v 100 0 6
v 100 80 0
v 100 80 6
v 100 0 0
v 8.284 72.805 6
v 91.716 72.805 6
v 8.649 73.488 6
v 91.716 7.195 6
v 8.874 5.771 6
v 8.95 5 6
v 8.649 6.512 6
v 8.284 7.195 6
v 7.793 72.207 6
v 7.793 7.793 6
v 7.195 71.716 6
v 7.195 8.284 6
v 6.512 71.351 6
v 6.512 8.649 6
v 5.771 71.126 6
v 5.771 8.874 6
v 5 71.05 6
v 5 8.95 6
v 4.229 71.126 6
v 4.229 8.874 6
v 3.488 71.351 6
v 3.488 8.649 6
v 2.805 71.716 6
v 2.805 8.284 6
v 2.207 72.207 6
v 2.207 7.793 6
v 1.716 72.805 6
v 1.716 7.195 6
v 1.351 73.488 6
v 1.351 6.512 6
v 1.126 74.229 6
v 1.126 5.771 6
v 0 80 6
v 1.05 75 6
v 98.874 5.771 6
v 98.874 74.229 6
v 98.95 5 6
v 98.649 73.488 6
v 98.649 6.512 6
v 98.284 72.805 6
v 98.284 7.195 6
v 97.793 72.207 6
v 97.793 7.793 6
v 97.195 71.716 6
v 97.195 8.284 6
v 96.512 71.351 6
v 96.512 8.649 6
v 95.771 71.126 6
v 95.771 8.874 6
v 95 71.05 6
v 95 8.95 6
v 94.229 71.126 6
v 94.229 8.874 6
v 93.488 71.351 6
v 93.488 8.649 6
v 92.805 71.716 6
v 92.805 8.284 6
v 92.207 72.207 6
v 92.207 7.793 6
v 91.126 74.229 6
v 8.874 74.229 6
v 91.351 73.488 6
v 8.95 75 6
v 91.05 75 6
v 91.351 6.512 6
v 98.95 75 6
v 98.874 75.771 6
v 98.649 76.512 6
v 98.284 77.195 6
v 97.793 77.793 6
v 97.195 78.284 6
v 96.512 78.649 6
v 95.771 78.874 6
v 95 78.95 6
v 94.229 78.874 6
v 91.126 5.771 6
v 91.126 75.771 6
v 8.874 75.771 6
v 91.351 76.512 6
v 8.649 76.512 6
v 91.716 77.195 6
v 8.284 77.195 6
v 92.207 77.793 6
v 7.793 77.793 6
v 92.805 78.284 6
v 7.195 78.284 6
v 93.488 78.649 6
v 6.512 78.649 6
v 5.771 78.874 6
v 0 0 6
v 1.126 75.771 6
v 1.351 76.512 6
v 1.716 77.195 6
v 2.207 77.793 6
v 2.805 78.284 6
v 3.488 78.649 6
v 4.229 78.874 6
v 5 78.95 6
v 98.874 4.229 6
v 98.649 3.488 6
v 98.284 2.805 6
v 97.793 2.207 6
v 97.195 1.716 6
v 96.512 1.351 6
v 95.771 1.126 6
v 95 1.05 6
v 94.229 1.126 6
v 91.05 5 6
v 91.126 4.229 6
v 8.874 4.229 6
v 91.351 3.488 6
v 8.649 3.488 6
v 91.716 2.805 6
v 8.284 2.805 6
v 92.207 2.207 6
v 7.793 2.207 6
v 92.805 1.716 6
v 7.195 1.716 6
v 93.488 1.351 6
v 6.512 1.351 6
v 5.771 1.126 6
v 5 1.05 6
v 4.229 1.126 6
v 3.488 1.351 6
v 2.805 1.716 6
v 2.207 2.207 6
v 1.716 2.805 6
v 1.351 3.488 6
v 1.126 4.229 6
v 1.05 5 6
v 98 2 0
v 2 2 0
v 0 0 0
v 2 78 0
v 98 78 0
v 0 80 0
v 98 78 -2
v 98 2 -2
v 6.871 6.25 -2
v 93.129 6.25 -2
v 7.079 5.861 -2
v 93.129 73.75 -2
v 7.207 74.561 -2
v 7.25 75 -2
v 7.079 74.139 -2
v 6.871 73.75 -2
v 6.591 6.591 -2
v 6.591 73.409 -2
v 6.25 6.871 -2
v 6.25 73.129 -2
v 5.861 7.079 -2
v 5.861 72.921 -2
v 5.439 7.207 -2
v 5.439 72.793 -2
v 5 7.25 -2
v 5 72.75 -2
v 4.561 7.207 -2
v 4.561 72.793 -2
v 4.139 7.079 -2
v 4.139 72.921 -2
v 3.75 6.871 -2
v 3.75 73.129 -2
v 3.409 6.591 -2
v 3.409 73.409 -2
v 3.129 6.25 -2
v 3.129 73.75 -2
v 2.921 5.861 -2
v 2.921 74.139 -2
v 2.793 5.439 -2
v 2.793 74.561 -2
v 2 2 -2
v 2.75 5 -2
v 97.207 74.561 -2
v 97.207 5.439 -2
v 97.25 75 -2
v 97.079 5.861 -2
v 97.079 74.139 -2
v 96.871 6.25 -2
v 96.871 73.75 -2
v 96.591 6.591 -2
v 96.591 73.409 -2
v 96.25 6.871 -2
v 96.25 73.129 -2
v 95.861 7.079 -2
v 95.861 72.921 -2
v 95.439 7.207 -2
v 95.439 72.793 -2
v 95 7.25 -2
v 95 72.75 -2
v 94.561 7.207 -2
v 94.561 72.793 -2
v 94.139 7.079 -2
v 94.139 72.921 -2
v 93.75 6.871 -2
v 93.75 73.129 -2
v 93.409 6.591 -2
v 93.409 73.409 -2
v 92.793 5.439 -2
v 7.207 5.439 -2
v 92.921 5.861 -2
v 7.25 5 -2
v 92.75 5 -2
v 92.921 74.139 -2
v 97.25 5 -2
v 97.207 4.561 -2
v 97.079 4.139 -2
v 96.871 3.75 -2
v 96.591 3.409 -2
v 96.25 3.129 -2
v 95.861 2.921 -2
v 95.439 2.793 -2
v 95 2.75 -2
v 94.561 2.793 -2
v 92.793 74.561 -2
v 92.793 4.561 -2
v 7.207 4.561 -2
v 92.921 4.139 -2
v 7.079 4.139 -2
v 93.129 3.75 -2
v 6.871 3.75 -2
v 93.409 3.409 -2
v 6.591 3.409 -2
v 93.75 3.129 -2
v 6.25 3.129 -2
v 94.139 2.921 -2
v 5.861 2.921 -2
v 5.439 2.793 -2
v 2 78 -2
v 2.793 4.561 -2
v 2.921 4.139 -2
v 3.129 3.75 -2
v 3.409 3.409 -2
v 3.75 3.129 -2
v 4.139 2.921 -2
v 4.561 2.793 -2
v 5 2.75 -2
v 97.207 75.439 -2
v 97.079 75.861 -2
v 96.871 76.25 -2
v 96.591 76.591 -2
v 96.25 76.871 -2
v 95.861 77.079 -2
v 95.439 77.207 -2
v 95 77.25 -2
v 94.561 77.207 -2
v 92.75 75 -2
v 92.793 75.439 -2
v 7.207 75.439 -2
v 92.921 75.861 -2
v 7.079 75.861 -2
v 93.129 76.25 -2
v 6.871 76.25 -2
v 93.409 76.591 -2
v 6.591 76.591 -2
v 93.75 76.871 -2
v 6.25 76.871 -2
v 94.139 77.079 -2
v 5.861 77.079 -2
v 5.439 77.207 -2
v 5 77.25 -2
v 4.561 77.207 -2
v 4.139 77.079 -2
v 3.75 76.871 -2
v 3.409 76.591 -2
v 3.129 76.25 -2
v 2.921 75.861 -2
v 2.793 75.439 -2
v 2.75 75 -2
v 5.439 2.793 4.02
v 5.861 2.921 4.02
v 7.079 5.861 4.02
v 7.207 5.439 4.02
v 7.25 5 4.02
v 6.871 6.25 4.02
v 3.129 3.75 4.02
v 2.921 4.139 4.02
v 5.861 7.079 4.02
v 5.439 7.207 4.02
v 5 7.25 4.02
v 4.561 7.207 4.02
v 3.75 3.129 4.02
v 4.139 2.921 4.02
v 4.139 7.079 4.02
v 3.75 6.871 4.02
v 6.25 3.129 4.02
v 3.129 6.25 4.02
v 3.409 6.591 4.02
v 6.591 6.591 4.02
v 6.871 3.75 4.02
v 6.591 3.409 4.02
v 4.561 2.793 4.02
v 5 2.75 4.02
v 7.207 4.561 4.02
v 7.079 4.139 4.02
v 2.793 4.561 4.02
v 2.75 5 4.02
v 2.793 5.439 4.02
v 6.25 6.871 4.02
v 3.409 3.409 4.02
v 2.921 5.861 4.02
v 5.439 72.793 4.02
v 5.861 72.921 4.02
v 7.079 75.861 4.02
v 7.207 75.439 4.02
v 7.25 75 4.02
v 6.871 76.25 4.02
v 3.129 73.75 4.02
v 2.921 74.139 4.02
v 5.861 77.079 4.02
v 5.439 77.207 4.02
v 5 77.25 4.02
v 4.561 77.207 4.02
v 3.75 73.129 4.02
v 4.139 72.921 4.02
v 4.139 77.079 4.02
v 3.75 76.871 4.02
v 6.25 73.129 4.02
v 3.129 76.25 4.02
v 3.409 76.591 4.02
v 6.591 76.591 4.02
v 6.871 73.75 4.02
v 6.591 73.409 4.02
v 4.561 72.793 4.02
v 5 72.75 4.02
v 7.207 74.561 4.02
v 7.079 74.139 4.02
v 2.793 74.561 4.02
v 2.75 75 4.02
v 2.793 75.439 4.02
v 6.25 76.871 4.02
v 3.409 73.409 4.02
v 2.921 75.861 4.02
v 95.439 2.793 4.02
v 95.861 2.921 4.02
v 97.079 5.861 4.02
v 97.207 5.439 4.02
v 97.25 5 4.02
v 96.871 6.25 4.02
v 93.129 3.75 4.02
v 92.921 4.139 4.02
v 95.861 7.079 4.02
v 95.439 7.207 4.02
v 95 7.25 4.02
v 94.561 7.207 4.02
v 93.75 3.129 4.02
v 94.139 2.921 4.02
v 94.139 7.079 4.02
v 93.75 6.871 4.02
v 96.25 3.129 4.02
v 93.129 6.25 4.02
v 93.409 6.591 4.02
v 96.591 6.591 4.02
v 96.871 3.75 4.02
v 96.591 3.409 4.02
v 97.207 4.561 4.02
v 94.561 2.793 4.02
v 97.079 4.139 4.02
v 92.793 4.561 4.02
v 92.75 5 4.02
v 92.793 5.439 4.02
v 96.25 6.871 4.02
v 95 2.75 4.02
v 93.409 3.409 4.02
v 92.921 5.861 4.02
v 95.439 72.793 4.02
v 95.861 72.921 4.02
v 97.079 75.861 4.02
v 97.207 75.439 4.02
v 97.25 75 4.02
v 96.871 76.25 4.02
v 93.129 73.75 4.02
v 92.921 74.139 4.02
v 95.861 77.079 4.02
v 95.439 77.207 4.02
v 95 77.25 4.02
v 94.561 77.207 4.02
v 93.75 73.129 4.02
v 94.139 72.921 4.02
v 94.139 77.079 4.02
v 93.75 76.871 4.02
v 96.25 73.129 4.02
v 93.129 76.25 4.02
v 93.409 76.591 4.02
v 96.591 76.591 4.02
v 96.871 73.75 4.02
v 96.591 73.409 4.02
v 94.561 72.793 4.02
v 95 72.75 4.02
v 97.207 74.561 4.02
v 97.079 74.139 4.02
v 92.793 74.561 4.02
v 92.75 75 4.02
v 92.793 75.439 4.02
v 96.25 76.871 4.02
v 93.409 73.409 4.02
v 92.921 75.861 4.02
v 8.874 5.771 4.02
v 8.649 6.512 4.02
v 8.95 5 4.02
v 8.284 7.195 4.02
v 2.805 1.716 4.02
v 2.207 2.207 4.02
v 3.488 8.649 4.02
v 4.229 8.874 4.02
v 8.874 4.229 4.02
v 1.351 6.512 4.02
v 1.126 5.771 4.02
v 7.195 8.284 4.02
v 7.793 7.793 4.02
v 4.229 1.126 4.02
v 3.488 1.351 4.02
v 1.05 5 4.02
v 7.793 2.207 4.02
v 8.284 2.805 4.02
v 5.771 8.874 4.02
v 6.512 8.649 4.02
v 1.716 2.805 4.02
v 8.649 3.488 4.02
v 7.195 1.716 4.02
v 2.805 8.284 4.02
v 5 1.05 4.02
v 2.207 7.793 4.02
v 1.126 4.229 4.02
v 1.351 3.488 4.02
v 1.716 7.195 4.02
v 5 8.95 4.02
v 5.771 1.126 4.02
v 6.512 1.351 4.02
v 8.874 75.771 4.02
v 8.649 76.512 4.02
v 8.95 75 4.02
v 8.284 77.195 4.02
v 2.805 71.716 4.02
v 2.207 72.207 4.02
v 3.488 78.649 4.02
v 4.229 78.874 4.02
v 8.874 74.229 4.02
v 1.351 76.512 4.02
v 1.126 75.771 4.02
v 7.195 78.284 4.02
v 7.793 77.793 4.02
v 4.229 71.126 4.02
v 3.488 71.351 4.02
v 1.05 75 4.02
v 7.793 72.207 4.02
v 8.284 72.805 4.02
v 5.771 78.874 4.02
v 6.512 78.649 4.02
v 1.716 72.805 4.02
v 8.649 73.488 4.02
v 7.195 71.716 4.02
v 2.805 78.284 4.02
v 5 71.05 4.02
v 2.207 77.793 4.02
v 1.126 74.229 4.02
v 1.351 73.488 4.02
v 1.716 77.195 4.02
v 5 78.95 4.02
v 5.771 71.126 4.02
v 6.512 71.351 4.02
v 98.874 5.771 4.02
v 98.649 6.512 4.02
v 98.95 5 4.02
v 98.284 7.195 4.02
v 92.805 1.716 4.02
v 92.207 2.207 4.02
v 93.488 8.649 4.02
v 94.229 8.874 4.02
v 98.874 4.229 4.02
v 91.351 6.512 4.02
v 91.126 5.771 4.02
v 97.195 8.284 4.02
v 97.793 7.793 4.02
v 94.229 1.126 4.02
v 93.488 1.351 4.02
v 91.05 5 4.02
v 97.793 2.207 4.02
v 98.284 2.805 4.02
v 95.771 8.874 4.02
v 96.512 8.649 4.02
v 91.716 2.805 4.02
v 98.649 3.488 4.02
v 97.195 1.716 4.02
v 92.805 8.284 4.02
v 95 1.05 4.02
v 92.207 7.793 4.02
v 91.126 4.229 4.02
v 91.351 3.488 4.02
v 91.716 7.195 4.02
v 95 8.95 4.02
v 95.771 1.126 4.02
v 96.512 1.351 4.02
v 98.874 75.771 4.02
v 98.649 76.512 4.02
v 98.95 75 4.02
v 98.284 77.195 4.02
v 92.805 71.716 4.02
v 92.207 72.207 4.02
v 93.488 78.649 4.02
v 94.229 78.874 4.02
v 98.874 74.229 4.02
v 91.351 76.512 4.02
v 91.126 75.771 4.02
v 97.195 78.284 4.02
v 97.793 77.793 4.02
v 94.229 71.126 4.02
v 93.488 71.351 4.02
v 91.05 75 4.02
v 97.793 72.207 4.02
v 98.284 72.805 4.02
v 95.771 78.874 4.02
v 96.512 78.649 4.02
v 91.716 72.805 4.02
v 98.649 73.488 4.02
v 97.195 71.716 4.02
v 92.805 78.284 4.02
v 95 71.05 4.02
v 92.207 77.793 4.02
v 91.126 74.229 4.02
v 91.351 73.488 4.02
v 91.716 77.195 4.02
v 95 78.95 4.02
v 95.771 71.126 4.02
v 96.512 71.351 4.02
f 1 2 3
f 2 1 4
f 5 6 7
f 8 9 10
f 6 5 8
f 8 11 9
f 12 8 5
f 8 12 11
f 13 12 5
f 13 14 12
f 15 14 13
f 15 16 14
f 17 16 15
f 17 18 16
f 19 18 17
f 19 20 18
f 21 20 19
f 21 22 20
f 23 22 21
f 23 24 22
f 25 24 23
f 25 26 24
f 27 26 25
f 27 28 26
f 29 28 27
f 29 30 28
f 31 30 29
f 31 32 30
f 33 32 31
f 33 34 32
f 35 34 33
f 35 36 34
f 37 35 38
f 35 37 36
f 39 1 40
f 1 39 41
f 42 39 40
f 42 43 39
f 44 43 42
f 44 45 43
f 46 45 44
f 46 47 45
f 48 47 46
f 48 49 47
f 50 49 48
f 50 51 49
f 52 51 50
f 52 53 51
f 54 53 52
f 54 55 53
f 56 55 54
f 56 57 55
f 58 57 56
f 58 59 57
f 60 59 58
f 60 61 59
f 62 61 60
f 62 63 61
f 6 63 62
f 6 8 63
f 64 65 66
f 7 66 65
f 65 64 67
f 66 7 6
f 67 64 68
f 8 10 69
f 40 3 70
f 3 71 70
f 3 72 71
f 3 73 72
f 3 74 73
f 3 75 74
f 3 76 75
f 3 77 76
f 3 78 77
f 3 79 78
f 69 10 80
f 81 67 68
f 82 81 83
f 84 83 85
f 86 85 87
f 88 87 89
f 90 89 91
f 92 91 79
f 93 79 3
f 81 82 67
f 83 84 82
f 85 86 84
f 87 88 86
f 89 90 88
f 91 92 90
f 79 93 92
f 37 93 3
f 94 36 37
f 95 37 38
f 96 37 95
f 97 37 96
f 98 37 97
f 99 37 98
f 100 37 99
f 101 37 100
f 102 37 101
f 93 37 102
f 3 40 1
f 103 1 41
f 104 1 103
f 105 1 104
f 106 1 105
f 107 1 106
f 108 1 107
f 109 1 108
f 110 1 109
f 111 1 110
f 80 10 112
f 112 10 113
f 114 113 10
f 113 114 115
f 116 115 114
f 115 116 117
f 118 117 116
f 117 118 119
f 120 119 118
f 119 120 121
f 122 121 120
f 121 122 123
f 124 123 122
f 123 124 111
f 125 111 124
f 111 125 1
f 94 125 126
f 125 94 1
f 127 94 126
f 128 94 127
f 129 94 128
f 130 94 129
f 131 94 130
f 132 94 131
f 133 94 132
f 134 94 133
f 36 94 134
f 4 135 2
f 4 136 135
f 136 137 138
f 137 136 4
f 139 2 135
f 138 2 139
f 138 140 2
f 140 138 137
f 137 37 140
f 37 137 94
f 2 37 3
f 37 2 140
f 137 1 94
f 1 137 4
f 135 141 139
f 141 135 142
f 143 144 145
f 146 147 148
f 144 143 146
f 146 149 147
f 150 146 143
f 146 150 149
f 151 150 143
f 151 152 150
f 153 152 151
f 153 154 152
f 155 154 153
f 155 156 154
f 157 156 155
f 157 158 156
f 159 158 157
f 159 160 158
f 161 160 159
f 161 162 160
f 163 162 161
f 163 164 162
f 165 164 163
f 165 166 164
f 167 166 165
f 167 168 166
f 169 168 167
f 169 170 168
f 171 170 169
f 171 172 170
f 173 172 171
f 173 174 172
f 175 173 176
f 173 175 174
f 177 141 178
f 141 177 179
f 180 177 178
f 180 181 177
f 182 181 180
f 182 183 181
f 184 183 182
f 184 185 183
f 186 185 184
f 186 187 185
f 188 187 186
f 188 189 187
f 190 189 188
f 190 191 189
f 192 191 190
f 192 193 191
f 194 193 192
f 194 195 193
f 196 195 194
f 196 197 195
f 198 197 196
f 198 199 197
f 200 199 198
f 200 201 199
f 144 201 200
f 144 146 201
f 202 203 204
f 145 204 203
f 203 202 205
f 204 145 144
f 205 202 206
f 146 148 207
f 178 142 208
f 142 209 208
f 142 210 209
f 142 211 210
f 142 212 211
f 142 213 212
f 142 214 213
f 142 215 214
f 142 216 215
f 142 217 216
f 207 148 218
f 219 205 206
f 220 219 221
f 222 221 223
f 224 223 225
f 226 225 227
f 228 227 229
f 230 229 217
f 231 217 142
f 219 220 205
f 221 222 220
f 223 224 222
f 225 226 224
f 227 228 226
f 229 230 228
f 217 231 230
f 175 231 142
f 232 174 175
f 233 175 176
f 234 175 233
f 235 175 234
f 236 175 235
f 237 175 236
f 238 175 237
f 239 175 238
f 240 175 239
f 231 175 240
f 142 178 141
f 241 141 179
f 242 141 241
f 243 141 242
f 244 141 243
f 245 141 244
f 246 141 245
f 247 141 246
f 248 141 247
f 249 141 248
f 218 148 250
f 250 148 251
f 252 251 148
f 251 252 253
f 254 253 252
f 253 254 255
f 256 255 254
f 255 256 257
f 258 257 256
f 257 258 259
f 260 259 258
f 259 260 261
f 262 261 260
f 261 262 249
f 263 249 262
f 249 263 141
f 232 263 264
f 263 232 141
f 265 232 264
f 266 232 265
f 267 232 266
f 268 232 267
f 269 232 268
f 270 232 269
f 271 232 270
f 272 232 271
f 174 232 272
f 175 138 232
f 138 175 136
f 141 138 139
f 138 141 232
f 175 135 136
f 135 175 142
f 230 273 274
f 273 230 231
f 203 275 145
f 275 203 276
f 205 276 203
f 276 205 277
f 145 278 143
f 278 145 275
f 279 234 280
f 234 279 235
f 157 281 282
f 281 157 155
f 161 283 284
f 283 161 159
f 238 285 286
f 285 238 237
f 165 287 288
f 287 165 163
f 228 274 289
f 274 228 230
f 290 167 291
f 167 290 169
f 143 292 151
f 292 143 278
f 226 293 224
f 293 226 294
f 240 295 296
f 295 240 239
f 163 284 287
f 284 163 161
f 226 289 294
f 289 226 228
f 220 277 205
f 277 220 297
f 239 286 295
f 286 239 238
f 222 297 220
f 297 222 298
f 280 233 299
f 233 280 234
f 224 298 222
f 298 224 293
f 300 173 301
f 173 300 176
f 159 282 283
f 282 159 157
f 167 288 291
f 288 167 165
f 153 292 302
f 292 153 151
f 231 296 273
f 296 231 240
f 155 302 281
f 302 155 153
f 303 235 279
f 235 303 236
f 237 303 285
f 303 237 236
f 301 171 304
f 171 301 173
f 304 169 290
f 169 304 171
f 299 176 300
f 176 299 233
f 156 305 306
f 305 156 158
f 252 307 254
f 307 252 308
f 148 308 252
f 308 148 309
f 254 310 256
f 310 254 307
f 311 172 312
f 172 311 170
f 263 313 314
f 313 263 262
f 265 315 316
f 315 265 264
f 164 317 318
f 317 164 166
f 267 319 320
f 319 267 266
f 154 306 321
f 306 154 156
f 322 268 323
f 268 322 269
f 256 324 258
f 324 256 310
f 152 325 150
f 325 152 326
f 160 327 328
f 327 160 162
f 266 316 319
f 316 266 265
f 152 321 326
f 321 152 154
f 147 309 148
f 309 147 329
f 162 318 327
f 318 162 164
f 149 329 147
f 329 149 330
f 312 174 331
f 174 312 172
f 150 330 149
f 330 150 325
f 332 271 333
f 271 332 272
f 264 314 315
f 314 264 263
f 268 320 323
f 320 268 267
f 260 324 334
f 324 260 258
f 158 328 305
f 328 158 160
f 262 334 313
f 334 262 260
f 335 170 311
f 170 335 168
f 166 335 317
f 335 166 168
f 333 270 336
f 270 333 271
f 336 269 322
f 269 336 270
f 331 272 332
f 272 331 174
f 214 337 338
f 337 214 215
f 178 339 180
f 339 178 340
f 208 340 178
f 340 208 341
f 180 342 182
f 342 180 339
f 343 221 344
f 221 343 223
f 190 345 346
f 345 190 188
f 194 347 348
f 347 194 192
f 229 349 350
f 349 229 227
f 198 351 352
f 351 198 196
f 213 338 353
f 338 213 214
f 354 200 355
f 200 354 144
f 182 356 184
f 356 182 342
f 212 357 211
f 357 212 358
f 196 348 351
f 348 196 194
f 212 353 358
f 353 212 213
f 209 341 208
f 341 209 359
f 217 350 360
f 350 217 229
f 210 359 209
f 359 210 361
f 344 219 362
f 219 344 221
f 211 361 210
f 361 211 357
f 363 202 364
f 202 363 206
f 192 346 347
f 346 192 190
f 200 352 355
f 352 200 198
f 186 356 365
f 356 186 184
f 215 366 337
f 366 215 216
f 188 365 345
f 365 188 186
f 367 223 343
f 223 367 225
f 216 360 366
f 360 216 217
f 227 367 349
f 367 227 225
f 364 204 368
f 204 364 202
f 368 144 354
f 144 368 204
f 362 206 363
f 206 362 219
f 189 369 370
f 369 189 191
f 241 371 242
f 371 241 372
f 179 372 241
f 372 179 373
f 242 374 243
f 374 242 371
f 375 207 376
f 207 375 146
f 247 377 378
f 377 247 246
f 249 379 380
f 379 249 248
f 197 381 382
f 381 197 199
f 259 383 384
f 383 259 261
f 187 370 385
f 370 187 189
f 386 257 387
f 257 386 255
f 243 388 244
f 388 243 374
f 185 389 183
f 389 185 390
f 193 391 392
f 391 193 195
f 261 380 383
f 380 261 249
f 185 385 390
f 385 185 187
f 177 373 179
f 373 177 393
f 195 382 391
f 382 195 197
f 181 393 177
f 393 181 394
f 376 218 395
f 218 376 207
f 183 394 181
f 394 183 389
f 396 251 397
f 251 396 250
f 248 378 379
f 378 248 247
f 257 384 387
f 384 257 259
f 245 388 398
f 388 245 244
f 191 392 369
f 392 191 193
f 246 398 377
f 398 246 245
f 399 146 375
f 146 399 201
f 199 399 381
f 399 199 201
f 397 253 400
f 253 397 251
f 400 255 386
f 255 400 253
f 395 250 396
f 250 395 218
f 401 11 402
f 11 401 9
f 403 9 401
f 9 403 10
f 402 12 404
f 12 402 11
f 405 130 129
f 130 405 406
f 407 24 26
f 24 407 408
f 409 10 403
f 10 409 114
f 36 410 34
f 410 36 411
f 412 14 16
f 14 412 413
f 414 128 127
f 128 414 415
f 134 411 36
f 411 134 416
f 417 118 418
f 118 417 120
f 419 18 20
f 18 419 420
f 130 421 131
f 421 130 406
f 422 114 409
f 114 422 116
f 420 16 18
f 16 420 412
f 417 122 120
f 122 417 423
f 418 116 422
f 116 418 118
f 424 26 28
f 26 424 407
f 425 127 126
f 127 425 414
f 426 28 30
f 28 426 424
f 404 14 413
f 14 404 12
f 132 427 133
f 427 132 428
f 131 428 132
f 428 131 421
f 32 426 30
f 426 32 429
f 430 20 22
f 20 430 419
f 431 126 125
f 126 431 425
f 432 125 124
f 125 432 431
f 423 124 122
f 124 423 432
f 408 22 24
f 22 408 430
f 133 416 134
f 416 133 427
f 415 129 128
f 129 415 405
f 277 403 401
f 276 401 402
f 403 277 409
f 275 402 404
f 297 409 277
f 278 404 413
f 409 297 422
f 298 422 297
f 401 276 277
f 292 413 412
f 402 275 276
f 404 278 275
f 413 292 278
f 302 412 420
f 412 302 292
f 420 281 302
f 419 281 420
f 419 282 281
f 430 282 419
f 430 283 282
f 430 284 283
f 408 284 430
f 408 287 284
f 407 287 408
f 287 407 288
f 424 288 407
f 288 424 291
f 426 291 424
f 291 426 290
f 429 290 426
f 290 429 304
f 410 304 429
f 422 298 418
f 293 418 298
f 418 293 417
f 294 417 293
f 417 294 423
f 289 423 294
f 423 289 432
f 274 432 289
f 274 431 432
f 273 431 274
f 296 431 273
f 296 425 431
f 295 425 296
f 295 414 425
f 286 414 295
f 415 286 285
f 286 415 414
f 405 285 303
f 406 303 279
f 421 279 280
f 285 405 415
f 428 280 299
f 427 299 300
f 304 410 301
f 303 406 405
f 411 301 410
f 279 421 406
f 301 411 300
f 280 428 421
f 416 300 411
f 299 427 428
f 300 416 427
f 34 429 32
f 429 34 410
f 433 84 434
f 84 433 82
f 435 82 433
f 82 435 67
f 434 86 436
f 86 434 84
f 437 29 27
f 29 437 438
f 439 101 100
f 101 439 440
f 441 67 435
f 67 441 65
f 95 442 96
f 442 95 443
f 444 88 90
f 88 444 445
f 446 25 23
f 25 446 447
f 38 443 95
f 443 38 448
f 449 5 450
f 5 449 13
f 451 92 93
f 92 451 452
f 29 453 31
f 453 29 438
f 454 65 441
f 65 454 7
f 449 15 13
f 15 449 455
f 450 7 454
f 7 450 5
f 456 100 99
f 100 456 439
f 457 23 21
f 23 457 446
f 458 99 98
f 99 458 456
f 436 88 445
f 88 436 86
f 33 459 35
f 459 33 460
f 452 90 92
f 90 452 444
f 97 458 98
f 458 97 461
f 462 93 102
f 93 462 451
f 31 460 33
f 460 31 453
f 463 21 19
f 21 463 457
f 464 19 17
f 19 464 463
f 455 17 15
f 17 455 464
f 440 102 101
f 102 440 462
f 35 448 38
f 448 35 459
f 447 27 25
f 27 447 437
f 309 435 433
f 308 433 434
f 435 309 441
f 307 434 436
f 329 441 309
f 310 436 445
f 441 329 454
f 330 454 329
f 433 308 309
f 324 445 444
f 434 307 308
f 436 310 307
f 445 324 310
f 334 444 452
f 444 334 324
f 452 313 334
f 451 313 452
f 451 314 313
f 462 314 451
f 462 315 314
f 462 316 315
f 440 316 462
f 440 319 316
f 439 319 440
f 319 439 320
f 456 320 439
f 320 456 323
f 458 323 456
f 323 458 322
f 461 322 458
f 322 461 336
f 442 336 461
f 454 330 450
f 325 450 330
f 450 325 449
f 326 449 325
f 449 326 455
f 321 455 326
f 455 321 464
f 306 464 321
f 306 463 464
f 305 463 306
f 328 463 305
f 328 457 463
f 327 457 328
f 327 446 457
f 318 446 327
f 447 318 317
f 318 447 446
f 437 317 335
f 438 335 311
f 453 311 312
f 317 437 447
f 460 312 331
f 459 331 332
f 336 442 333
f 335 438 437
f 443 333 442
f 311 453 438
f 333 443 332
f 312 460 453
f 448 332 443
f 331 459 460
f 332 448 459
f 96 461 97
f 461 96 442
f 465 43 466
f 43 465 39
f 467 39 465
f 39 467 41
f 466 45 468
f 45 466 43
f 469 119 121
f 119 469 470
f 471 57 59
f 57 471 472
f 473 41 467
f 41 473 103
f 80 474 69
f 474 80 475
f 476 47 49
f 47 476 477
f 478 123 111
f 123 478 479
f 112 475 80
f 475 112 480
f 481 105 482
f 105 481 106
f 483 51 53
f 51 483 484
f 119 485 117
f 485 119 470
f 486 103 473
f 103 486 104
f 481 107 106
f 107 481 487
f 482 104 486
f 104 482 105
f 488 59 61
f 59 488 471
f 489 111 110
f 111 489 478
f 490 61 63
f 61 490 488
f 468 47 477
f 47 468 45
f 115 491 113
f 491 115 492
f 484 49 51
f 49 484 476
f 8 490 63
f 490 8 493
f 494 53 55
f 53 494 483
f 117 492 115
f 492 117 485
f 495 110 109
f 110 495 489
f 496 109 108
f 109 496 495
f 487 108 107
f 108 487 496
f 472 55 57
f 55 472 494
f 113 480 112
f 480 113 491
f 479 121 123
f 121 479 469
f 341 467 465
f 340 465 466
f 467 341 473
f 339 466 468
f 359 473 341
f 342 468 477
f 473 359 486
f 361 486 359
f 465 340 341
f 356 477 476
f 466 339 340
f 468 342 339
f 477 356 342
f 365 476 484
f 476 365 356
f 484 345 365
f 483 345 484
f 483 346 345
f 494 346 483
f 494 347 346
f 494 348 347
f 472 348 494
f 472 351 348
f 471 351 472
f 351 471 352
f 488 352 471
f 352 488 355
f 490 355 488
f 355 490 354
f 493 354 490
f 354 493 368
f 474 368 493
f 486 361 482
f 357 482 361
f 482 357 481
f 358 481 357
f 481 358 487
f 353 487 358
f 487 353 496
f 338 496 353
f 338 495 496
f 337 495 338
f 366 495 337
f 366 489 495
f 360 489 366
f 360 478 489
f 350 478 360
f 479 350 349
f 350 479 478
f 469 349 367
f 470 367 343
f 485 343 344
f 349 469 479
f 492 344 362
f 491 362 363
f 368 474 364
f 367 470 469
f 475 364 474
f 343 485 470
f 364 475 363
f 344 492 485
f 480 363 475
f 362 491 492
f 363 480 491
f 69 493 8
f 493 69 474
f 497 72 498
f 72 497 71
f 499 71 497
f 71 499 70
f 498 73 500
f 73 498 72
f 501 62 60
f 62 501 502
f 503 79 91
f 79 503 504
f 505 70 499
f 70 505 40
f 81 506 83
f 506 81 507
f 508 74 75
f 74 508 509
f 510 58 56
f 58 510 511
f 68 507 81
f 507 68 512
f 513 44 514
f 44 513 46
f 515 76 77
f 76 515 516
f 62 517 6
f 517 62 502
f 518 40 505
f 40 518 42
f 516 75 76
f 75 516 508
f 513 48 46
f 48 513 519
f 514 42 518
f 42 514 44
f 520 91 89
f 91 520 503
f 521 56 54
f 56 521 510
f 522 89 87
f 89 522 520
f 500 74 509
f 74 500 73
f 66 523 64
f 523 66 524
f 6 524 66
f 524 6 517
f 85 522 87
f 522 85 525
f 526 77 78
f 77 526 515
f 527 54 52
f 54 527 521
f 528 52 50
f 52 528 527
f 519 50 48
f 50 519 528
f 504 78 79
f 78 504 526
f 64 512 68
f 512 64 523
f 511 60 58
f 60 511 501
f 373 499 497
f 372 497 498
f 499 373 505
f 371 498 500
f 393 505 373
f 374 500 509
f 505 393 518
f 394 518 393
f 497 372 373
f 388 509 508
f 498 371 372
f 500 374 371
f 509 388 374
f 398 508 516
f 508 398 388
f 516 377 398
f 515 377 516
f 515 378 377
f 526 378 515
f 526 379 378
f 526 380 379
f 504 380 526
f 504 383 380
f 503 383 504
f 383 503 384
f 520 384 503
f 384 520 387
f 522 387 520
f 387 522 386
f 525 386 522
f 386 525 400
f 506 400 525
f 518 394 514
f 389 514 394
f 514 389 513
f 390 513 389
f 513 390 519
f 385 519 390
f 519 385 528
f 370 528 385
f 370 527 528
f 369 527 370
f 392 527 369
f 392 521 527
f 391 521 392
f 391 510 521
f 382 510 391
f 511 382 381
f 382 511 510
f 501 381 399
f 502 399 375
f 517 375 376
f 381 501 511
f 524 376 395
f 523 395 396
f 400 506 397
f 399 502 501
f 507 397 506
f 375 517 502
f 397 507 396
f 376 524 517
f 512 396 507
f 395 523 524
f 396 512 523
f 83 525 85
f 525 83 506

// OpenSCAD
$fn = 32;

// ----------------------------------------------------------------------
// Enclosure lid: 100 x 80 x 6 mm, 4 bolt holes
// ----------------------------------------------------------------------

// --- parameters (mm) ---
length = 100;             // lid length, X
width = 80;               // lid width, Y
plate_t = 6;              // lid plate thickness
bolt_d = 4.5;             // bolt clearance
boss_lip = 5;             // bolt hole inset from the corner
sink = 1;                 // overlap of the lip and ribs into the plate
lip_h = 3;                // lip height below the plate
lip_wall = 2;             // lip wall thickness
cs_d = 7.9;               // countersink diameter
cs_h = 1.98;              // countersink depth

module plate() {
  cube([length, width, plate_t]);
  /* lip that drops into the housing opening, sunk into the plate */
  translate([lip_wall, lip_wall, -lip_h + sink]) cube([length - 2 * lip_wall, width - 2 * lip_wall, lip_h]);
}

difference() {
  plate();
  /* bolt pattern matching the corner bosses */
  for (sx = [0, 1]) for (sy = [0, 1])
    translate([sx * (length - 2 * boss_lip) + boss_lip, sy * (width - 2 * boss_lip) + boss_lip, -lip_h - 1])
      cylinder(h = plate_t + lip_h + 2, d = bolt_d);
  /* countersinks so the heads sit flush */
  for (sx = [0, 1]) for (sy = [0, 1])
    translate([sx * (length - 2 * boss_lip) + boss_lip, sy * (width - 2 * boss_lip) + boss_lip, plate_t - cs_h])
      cylinder(h = cs_h + 0.5, d = cs_d);
}
